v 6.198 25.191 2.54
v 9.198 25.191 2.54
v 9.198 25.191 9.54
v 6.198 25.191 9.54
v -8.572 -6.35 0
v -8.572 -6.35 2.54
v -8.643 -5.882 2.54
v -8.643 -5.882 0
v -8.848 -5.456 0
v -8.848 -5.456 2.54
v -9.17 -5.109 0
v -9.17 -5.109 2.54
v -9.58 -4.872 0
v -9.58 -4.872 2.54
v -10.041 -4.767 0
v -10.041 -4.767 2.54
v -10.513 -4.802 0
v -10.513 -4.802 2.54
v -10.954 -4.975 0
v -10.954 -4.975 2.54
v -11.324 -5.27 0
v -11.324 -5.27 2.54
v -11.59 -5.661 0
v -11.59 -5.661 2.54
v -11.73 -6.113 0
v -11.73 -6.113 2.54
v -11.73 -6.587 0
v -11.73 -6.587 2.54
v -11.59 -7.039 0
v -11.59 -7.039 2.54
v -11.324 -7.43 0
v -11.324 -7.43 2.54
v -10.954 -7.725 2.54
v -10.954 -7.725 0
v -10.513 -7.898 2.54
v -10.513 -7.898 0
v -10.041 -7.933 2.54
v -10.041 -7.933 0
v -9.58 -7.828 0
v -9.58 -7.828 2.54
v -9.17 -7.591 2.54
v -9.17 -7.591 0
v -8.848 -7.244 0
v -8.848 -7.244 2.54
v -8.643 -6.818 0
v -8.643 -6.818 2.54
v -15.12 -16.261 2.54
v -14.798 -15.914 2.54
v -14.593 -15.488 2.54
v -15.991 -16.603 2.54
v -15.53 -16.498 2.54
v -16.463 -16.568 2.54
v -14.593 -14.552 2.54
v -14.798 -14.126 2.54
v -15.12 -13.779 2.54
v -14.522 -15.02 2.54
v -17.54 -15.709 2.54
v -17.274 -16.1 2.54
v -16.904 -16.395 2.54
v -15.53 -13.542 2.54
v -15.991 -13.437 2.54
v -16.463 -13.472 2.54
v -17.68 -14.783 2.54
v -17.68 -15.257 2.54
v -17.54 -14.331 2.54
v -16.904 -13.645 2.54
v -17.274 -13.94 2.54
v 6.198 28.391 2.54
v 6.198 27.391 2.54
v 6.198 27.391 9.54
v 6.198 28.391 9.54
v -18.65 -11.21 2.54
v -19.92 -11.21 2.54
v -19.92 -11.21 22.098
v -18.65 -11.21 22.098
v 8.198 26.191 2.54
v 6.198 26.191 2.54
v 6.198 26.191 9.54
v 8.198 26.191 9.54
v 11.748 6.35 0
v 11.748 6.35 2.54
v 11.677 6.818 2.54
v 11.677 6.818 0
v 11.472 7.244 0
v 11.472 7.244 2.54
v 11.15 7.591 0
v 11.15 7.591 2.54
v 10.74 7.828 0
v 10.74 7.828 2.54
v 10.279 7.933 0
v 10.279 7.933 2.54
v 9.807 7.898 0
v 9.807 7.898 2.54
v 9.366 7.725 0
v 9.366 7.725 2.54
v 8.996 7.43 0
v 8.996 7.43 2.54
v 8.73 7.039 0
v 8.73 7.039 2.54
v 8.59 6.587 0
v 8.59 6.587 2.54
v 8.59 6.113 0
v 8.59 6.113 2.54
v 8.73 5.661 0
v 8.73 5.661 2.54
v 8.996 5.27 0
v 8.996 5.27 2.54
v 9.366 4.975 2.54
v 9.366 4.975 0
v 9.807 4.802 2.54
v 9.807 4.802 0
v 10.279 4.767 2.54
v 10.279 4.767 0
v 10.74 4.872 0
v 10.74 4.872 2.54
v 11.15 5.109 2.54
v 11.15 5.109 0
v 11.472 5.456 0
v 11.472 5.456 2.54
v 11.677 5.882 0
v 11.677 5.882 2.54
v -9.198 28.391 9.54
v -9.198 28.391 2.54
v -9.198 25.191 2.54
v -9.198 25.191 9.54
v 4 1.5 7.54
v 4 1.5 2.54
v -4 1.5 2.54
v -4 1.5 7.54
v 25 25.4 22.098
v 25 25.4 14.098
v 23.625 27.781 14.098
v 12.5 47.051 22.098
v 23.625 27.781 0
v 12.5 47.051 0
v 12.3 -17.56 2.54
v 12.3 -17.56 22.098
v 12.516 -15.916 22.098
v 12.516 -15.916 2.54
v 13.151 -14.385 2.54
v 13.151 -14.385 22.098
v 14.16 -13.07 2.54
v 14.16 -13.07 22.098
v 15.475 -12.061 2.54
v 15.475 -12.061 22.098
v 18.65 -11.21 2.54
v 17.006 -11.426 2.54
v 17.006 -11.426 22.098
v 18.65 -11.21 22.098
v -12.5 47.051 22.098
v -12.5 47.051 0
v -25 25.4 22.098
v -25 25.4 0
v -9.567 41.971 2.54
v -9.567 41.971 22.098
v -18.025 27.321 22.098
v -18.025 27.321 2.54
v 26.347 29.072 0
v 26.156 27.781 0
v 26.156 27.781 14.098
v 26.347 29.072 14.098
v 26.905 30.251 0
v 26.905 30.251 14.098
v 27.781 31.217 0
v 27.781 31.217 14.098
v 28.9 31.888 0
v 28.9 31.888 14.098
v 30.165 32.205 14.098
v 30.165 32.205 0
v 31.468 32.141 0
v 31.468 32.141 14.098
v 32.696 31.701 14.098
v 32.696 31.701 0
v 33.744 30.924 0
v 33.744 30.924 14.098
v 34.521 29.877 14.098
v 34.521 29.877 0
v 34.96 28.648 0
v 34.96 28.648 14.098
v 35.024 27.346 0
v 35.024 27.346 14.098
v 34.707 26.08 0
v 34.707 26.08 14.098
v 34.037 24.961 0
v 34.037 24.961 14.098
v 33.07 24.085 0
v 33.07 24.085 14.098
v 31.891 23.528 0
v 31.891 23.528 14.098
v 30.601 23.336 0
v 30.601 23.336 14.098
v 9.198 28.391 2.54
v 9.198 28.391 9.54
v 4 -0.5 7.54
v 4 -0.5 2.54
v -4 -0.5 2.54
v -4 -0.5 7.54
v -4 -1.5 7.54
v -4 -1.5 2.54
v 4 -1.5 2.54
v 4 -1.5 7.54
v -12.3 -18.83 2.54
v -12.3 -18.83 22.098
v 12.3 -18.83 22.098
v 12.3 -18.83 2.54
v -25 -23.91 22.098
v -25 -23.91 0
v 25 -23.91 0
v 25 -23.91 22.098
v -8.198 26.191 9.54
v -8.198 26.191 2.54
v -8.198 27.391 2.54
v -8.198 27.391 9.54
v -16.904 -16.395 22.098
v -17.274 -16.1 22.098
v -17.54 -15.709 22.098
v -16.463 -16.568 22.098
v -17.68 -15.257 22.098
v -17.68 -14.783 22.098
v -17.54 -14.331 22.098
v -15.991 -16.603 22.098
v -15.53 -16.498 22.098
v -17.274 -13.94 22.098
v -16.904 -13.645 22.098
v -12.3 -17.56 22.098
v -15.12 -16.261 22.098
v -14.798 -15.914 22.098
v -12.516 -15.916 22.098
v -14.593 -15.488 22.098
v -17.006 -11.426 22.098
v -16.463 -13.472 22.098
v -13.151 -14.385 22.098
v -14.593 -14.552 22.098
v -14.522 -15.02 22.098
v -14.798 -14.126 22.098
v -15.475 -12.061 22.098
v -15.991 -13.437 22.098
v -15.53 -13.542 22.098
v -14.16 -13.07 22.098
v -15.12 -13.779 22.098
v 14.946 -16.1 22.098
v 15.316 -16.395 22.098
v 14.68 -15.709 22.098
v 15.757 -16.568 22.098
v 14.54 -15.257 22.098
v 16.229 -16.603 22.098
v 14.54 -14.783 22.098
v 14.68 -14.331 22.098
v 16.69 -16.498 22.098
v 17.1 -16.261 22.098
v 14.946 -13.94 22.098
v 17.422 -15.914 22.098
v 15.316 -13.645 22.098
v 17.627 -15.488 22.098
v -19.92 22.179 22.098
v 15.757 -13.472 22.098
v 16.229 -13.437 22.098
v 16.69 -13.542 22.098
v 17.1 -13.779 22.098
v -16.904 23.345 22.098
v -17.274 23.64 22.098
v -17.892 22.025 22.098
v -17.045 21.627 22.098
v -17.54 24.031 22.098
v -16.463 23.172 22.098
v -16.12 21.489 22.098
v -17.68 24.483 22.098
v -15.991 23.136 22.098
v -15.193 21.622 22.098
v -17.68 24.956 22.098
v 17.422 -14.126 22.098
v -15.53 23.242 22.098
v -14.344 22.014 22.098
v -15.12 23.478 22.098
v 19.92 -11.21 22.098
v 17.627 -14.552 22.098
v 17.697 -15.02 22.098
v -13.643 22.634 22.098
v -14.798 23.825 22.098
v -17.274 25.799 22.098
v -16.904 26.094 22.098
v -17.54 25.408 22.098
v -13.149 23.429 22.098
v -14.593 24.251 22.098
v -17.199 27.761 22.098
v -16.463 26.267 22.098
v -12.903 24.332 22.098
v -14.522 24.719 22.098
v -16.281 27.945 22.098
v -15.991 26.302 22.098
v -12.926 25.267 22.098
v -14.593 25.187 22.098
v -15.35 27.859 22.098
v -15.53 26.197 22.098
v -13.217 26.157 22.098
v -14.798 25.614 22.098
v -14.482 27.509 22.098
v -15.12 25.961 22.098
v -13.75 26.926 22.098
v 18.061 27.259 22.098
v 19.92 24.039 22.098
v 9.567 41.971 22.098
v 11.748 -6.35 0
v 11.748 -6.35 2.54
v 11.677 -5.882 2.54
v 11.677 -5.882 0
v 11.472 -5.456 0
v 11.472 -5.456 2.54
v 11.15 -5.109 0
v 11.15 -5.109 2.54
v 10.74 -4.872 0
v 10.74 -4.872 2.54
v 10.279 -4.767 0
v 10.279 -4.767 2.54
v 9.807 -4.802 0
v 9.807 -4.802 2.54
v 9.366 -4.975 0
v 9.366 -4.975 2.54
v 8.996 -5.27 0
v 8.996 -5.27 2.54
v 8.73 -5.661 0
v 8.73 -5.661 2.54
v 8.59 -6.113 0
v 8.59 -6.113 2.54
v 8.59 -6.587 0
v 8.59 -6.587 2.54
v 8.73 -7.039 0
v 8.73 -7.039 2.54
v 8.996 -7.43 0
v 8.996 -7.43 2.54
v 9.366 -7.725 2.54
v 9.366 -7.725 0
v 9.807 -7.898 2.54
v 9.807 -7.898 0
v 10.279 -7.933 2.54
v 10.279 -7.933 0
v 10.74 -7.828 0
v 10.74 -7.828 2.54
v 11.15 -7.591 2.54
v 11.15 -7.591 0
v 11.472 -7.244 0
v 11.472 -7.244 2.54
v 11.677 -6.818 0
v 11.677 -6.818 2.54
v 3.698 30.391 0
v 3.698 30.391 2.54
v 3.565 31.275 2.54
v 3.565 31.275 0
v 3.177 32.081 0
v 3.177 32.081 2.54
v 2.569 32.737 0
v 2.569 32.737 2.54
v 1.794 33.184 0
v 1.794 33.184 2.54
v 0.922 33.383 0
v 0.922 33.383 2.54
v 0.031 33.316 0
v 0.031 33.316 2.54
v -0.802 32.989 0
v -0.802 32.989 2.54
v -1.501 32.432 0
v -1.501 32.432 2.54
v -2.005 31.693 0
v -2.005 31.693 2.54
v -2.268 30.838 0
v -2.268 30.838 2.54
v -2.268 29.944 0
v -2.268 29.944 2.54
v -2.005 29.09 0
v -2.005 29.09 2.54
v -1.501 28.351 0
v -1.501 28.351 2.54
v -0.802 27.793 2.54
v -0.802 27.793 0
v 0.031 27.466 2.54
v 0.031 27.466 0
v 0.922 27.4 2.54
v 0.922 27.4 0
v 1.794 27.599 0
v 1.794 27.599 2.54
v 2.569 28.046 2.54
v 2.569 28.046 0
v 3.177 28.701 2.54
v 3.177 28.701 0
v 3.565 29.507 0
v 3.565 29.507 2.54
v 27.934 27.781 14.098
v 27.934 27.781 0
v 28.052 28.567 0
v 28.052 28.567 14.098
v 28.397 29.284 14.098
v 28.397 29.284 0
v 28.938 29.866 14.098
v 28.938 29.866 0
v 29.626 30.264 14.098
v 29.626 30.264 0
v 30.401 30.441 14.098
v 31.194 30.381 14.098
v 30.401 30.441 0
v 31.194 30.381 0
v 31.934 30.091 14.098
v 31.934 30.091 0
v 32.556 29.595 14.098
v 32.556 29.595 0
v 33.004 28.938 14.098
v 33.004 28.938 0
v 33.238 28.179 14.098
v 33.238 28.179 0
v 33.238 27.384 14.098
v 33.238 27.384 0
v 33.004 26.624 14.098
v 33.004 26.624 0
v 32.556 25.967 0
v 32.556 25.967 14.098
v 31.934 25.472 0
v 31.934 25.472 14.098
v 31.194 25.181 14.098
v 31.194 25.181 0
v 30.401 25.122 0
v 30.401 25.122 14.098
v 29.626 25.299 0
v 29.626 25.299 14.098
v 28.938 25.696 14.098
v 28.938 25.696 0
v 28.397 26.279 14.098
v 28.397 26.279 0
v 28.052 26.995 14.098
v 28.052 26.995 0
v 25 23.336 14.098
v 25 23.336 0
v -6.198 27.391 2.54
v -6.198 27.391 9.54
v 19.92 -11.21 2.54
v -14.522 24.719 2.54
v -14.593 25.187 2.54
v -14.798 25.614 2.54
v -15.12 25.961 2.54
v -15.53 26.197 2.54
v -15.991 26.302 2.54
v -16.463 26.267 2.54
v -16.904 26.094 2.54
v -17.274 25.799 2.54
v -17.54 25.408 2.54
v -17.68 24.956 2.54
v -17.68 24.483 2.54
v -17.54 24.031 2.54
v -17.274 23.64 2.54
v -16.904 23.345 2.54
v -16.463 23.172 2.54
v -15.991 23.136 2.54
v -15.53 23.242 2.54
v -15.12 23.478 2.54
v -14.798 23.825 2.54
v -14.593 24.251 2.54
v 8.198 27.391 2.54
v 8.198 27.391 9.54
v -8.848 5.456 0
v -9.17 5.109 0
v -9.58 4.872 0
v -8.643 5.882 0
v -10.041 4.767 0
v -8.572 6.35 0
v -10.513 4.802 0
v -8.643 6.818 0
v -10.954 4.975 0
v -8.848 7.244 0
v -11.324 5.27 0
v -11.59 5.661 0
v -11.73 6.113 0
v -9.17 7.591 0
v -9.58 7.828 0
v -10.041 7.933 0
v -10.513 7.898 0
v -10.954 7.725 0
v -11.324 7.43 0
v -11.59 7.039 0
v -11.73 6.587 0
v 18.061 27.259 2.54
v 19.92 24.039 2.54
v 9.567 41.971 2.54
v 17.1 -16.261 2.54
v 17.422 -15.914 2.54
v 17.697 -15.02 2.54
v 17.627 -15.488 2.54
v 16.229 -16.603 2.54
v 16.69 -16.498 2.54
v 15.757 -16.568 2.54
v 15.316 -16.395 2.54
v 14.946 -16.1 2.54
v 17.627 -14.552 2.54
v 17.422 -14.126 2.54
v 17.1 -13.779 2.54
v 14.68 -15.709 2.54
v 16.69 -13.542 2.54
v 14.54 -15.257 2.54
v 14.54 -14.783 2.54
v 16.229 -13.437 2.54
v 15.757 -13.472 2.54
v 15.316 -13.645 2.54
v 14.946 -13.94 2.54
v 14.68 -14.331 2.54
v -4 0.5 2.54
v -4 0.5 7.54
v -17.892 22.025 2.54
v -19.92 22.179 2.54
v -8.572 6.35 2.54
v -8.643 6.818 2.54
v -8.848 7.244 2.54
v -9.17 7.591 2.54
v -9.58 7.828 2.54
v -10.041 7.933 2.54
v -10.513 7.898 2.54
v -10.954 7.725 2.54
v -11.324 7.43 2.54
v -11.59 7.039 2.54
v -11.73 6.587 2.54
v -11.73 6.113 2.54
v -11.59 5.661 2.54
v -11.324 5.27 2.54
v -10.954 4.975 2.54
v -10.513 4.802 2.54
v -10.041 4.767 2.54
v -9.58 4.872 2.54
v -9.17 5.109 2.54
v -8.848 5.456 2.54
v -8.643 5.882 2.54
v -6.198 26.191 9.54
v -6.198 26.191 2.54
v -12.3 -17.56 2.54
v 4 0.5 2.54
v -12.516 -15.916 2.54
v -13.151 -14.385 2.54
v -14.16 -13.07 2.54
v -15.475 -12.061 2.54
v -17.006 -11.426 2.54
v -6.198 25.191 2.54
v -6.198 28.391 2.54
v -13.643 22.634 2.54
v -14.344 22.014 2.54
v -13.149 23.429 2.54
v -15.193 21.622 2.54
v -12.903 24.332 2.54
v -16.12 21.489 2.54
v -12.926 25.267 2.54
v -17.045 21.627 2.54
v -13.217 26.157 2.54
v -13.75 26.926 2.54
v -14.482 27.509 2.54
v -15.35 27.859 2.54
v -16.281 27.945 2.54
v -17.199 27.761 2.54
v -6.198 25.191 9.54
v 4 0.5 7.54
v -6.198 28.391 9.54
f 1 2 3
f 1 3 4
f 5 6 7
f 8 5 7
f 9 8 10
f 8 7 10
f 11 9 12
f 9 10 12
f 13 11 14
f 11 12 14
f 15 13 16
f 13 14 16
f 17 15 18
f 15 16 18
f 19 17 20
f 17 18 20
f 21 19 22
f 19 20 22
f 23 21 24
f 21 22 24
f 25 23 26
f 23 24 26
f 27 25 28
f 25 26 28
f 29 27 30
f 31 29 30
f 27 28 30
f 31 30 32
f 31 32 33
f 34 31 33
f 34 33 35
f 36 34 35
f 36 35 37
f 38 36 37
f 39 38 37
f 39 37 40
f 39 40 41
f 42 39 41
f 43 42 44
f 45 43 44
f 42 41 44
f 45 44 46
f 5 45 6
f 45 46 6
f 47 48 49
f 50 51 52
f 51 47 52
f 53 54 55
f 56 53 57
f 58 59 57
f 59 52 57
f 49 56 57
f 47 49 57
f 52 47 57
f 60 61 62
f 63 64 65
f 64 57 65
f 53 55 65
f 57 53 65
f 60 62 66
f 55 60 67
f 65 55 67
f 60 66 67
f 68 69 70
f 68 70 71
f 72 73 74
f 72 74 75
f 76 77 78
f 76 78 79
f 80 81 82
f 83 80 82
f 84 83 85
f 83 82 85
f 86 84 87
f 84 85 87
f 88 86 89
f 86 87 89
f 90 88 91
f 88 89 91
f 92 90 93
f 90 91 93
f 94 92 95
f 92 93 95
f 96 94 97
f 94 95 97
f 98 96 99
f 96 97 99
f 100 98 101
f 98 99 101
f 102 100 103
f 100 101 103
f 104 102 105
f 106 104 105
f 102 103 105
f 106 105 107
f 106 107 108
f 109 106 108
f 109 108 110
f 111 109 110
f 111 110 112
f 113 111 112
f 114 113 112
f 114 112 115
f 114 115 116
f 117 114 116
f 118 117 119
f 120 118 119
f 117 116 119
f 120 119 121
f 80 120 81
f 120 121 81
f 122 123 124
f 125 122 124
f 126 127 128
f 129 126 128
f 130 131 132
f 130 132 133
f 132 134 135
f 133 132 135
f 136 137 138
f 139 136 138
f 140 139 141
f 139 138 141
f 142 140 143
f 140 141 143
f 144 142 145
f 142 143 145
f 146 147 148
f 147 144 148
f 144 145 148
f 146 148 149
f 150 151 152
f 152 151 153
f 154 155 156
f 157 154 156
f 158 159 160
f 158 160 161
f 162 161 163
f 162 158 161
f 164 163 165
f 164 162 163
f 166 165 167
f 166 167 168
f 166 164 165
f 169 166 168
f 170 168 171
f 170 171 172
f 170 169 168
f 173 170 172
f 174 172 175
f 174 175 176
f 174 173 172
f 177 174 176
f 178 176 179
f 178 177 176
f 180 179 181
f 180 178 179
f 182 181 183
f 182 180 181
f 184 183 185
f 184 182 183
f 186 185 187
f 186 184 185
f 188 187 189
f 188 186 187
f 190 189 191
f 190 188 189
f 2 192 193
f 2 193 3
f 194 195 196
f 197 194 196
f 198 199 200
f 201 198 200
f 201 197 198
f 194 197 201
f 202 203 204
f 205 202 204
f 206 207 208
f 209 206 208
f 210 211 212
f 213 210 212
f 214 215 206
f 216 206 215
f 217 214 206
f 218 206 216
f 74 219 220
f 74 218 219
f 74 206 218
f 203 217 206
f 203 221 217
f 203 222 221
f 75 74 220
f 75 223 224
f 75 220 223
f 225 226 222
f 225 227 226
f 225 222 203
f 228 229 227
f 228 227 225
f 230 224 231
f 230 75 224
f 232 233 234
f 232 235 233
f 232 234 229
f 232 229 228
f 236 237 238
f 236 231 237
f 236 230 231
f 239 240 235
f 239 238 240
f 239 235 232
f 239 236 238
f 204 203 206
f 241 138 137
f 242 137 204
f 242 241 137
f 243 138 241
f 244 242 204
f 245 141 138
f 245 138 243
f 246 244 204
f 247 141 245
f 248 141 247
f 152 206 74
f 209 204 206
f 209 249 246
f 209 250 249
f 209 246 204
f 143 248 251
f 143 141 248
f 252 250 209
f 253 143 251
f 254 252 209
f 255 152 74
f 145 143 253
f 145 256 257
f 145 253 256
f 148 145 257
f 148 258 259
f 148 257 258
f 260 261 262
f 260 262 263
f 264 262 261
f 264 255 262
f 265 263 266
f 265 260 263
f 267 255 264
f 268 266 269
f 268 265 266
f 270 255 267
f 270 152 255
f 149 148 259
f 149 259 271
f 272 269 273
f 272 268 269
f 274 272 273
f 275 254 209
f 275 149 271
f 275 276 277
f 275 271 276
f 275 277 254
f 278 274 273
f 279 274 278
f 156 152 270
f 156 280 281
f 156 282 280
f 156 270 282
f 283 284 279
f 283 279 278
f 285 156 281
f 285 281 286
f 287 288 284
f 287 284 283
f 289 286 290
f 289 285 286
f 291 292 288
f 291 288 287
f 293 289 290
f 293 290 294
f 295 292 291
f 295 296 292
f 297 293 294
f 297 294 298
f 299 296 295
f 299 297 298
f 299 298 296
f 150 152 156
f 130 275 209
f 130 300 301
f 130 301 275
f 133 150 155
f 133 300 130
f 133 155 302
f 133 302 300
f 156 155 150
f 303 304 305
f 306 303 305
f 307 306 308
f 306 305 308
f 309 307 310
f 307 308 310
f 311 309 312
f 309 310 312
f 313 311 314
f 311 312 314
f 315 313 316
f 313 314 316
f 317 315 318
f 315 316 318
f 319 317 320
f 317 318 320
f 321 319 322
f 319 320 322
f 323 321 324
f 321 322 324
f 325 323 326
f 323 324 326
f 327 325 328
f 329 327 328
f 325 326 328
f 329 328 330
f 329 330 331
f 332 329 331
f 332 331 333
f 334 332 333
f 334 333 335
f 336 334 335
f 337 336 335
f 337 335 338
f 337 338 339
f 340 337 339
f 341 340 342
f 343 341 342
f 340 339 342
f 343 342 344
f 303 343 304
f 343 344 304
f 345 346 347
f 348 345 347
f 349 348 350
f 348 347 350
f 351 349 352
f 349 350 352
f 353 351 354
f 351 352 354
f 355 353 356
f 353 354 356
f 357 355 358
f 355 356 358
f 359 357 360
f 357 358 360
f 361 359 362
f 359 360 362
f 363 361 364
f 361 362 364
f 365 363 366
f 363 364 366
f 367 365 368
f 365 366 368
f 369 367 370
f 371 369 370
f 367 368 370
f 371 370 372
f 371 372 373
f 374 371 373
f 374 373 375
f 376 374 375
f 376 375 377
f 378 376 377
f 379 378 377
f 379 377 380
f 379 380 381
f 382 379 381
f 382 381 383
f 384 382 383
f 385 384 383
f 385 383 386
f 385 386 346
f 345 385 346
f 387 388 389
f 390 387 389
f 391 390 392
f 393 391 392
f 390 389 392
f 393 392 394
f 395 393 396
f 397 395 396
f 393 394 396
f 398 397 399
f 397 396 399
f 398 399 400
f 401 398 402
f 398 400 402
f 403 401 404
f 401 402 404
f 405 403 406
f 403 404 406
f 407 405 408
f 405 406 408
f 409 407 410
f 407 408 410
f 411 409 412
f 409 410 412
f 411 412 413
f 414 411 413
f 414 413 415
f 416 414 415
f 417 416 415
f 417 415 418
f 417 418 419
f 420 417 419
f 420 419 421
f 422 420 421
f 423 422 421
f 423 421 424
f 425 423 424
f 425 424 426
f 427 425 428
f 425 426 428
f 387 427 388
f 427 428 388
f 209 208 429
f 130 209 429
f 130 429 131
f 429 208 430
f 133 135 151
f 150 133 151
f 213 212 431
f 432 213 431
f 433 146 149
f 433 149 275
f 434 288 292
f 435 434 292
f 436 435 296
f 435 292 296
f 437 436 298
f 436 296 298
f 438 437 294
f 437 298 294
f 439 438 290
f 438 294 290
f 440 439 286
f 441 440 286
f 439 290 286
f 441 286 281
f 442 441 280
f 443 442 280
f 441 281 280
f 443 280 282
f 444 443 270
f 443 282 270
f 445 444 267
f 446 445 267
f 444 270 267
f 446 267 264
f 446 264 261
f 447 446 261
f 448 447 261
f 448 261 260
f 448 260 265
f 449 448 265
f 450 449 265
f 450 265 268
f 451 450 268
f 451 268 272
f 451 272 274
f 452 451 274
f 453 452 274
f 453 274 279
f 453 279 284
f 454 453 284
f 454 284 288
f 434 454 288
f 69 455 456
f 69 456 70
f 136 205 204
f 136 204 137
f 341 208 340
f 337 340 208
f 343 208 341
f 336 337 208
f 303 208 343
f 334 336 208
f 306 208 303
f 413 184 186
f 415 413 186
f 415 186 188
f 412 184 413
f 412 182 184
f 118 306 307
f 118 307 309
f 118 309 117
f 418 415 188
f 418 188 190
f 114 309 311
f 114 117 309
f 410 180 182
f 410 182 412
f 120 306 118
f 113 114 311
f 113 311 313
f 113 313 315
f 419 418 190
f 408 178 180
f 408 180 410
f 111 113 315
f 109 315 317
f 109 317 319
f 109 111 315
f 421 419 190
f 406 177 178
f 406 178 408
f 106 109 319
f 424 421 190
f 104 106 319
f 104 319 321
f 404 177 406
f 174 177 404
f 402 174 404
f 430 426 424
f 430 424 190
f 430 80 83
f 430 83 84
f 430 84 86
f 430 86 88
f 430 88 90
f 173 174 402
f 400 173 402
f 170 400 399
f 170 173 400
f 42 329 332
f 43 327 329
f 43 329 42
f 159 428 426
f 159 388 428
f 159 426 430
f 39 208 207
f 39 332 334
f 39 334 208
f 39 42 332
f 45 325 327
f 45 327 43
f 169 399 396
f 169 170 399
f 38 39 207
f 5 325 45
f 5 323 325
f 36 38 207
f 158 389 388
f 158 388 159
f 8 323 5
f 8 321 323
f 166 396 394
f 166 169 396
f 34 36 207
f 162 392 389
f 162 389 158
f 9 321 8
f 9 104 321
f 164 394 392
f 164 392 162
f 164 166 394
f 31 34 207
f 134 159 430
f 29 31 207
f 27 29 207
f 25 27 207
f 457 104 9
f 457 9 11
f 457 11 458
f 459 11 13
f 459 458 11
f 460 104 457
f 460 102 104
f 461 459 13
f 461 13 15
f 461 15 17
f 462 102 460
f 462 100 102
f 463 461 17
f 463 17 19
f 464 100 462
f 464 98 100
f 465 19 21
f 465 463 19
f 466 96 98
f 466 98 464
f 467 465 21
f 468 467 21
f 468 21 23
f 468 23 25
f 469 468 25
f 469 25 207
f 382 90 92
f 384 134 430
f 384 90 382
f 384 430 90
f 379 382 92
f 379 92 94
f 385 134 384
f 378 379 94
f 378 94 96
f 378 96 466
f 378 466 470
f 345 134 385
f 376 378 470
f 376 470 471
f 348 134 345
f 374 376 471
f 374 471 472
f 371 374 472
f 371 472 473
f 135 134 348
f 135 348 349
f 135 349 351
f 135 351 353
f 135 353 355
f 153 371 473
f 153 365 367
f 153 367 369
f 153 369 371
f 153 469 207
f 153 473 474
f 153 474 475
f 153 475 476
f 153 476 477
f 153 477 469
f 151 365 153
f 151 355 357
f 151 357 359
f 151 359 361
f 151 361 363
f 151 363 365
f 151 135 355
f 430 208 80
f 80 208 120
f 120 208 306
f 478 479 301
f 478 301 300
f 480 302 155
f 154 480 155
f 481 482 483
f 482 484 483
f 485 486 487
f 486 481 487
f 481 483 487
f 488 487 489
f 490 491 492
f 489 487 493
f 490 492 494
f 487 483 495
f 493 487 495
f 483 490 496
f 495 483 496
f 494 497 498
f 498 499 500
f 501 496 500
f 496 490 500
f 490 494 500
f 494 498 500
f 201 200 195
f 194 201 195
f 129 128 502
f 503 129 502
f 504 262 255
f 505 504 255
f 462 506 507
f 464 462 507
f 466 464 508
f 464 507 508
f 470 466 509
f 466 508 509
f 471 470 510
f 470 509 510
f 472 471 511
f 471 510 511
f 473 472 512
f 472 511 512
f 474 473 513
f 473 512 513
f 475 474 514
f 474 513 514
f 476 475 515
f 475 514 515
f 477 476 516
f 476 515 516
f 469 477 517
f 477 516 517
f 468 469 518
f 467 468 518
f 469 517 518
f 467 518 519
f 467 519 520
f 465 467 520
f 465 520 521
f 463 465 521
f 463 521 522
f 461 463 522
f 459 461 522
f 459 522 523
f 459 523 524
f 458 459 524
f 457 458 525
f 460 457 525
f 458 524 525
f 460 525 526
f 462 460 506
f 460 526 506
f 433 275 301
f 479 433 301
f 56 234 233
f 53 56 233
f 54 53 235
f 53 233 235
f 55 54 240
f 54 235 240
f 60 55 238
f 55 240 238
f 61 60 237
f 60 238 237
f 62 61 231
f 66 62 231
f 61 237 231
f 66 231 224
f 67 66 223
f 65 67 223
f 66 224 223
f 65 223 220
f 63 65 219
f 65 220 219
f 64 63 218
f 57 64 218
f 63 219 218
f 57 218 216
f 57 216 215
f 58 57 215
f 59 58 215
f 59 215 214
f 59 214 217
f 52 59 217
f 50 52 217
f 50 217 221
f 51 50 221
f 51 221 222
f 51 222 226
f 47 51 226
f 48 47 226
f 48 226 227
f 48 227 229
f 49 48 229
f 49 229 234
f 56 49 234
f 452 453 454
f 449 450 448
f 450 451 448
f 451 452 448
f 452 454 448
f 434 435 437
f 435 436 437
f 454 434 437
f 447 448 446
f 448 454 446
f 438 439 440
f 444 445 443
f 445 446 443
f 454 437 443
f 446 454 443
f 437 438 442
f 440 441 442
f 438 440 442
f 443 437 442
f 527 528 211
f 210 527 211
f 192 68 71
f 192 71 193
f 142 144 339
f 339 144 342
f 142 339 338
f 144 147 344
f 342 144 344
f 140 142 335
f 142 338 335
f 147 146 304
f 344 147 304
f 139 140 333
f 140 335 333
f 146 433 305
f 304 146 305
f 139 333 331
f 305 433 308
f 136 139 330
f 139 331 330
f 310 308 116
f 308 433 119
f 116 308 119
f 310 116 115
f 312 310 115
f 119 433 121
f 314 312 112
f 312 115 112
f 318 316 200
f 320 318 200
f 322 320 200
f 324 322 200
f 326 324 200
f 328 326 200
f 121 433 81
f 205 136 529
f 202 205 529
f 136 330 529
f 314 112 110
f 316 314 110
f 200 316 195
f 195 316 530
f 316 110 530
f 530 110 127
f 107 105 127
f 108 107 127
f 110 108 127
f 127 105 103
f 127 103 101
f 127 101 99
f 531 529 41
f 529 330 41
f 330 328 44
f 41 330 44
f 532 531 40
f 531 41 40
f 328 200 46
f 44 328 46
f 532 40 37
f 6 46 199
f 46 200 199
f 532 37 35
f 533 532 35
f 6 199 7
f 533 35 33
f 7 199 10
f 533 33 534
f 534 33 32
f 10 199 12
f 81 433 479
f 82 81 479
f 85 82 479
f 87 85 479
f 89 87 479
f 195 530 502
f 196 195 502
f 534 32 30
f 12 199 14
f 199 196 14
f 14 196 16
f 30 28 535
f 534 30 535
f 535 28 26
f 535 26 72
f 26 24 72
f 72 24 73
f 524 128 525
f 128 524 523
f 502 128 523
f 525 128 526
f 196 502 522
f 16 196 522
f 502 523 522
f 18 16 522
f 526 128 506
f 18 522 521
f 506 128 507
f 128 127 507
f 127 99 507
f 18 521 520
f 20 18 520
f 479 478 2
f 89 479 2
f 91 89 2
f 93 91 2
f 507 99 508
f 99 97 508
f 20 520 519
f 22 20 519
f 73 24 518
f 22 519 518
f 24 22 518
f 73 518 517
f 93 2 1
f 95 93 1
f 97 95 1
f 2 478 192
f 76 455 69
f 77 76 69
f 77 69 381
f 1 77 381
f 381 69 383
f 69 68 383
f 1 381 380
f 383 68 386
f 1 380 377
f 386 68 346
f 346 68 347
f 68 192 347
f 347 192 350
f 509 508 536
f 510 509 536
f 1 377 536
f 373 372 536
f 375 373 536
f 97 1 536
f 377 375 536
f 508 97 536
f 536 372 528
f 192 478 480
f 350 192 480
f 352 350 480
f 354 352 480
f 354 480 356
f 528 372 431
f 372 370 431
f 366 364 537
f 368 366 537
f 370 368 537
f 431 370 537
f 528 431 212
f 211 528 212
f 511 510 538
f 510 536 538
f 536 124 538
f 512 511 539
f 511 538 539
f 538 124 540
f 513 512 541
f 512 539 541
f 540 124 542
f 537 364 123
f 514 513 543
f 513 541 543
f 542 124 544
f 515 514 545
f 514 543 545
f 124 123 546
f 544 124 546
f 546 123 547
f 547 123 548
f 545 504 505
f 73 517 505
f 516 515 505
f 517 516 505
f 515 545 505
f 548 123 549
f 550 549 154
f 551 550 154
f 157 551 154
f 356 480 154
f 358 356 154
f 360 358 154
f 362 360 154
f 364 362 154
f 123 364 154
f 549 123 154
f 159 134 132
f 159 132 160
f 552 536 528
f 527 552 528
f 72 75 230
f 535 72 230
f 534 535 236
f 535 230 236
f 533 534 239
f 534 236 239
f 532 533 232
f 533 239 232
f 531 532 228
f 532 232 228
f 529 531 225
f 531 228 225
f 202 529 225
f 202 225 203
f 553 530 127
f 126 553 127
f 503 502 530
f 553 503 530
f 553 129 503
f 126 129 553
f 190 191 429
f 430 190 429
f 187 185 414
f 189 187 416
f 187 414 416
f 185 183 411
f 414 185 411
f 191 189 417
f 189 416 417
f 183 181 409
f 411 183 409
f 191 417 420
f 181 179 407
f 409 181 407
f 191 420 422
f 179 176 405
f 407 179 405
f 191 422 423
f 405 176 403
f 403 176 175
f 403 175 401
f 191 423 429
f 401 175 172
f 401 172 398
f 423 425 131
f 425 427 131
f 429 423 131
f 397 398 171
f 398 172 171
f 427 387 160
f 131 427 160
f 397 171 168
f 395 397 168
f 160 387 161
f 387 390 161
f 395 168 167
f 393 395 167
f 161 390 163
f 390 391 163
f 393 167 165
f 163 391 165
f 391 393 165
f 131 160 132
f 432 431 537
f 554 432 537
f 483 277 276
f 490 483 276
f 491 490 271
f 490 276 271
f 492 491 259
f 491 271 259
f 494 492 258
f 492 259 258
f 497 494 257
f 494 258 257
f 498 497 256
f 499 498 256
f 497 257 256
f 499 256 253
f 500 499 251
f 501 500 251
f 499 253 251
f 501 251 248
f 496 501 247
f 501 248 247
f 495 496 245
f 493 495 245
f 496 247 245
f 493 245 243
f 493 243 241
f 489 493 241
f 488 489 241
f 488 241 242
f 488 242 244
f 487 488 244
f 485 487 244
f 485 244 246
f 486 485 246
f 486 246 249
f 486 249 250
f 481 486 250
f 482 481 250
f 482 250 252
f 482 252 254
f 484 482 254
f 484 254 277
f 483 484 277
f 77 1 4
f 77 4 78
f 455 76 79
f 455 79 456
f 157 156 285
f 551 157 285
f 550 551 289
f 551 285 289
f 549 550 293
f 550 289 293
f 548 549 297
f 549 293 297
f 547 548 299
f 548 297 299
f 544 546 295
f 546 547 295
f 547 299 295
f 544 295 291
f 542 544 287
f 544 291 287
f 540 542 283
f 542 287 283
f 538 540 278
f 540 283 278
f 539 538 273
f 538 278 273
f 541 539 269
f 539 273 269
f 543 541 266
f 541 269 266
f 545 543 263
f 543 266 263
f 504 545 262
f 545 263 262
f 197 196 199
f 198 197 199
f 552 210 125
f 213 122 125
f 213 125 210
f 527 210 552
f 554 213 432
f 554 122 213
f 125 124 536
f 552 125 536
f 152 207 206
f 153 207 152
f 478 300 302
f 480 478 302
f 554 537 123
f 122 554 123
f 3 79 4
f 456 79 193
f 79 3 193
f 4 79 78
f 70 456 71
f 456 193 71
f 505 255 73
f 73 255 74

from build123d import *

# Parameters (mm, degrees)
BOSS_EXTRUDE1_DEPTH = 22.098
SKETCH3_R           = 2.667
BOSS_EXTRUDE2_DEPTH = 14.098
SKETCH11_R          = 1.5875
CUT_EXTRUDE7_DEPTH  = 33.02
BOSS_EXTRUDE4_DEPTH = 2.54
SKETCH16_R          = 1.5875
CUT_EXTRUDE11_DEPTH = 2.54
BOSS_EXTRUDE5_DEPTH = 7
CUT_EXTRUDE14_DEPTH = 7
SKETCH22_W          = 8
SKETCH22_H          = 1
BOSS_EXTRUDE6_DEPTH = 5


with BuildPart() as part:
    # Sketch1 → Boss-Extrude1 (new body)
    with BuildSketch(Plane.XY):
        Polygon((-25, 25.4), (-25, -23.909999932), (25, -23.909999932), (25, 25.4), (12.5, 47.050635095), (-12.5, 47.050635095), align=None)
    extrude(amount=BOSS_EXTRUDE1_DEPTH)

    # Sketch3 → Boss-Extrude2 (add)
    with BuildSketch(Plane(origin=(0, 0, 0), x_dir=(-1, 0, 0), z_dir=(0, 0, -1))):
        with BuildLine():
            ThreePointArc((-26.155685571, 27.78125), (-33.743775214, 30.924339642), (-30.600685571, 23.33625))
            Line((-30.600685571, 23.33625), (-25, 23.33625))
            Line((-25, 23.33625), (-25, 25.4))
            Line((-25, 25.4), (-23.625184671, 27.78125))
            Line((-23.625184671, 27.78125), (-26.155685571, 27.78125))
        make_face()
        with Locations((-30.600685571, 27.78125)):
            Circle(SKETCH3_R, mode=Mode.SUBTRACT)
    extrude(amount=-BOSS_EXTRUDE2_DEPTH)

    # Sketch11 → Cut-Extrude7 (cut)
    with BuildSketch(Plane.XY.offset(22.098)):
        with BuildLine():
            Line((-17.892329478, 22.025071278), (-19.92, 22.179409051))
            Line((-19.92, 22.179409051), (-19.92, -11.209999932))
            Line((-19.92, -11.209999932), (-18.65, -11.209999932))
            ThreePointArc((-18.65, -11.209999932), (-14.159871939, -13.069871871), (-12.3, -17.559999932))
            Line((-12.3, -17.559999932), (-12.3, -18.829999932))
            Line((-12.3, -18.829999932), (12.3, -18.829999932))
            Line((12.3, -18.829999932), (12.3, -17.559999932))
            ThreePointArc((12.3, -17.559999932), (14.159871939, -13.069871871), (18.65, -11.209999932))
            Line((18.65, -11.209999932), (19.92, -11.209999932))
            Line((19.92, -11.209999932), (19.92, 24.038818102))
            Line((19.92, 24.038818102), (18.060590949, 27.259409051))
            Line((18.060590949, 27.259409051), (9.567060633, 41.970635095))
            Line((9.567060633, 41.970635095), (-9.567060633, 41.970635095))
            Line((-9.567060633, 41.970635095), (-18.024928281, 27.321178603))
            ThreePointArc((-18.024928281, 27.321178603), (-12.880508254, 24.800266004), (-17.892329478, 22.025071278))
        make_face()
        with Locations((-16.11, 24.719409119)):
            Circle(SKETCH11_R)
        with Locations((16.11, -15.02)):
            Circle(SKETCH11_R)
        with Locations((-16.11, -15.019999932)):
            Circle(SKETCH11_R)
    extrude(amount=-CUT_EXTRUDE7_DEPTH, mode=Mode.SUBTRACT)

    # Sketch12 → Boss-Extrude4 (add)
    with BuildSketch(Plane(origin=(0, 0, 0), x_dir=(-1, 0, 0), z_dir=(0, 0, -1))):
        Polygon((-25, -23.909999932), (25, -23.909999932), (25, 25.4), (12.5, 47.050635095), (-12.5, 47.050635095), (-25, 25.4), align=None)
    extrude(amount=-BOSS_EXTRUDE4_DEPTH)

    # Sketch16 → Cut-Extrude11 (cut)
    with BuildSketch(Plane.XY.offset(2.54)):
        with Locations((-10.16, 6.35)):
            Circle(SKETCH16_R)
        with Locations((-10.16, -6.35)):
            Circle(SKETCH16_R)
        with Locations((10.16, 6.35)):
            Circle(SKETCH16_R)
        with Locations((10.16, -6.35)):
            Circle(SKETCH16_R)
    extrude(amount=-CUT_EXTRUDE11_DEPTH, mode=Mode.SUBTRACT)

    # Sketch20 → Boss-Extrude5 (add)
    with BuildSketch(Plane.XY.offset(2.54)):
        Polygon((-9.198279291, 25.191225954), (-6.198279291, 25.191225954), (-6.198279291, 26.191225954), (-8.198279291, 26.191225954), (-8.198279291, 27.391225954), (-6.198279291, 27.391225954), (-6.198279291, 28.391225954), (-9.198279291, 28.391225954), align=None)
        Polygon((8.198279291, 26.191225954), (8.198279291, 27.391225954), (6.198279291, 27.391225954), (6.198279291, 28.391225954), (9.198279291, 28.391225954), (9.198279291, 25.191225954), (6.198279291, 25.191225954), (6.198279291, 26.191225954), align=None)
    extrude(amount=BOSS_EXTRUDE5_DEPTH)

    # Sketch21 → Cut-Extrude14 (cut)
    with BuildSketch(Plane.XY.offset(2.54)):
        with BuildLine():
            ThreePointArc((0.698279291, 27.391225954), (2.819599635, 28.269905611), (3.698279291, 30.391225954))
            ThreePointArc((3.698279291, 30.391225954), (-1.423041052, 32.512546298), (0.698279291, 27.391225954))
        make_face()
    extrude(amount=-CUT_EXTRUDE14_DEPTH, mode=Mode.SUBTRACT)

    # Sketch22 → Boss-Extrude6 (add)
    with BuildSketch(Plane.XY.offset(2.54)):
        with Locations((0, 1)):
            Rectangle(SKETCH22_W, SKETCH22_H)
        with Locations((0, -1)):
            Rectangle(SKETCH22_W, SKETCH22_H)
    extrude(amount=BOSS_EXTRUDE6_DEPTH)


solid = part.part
